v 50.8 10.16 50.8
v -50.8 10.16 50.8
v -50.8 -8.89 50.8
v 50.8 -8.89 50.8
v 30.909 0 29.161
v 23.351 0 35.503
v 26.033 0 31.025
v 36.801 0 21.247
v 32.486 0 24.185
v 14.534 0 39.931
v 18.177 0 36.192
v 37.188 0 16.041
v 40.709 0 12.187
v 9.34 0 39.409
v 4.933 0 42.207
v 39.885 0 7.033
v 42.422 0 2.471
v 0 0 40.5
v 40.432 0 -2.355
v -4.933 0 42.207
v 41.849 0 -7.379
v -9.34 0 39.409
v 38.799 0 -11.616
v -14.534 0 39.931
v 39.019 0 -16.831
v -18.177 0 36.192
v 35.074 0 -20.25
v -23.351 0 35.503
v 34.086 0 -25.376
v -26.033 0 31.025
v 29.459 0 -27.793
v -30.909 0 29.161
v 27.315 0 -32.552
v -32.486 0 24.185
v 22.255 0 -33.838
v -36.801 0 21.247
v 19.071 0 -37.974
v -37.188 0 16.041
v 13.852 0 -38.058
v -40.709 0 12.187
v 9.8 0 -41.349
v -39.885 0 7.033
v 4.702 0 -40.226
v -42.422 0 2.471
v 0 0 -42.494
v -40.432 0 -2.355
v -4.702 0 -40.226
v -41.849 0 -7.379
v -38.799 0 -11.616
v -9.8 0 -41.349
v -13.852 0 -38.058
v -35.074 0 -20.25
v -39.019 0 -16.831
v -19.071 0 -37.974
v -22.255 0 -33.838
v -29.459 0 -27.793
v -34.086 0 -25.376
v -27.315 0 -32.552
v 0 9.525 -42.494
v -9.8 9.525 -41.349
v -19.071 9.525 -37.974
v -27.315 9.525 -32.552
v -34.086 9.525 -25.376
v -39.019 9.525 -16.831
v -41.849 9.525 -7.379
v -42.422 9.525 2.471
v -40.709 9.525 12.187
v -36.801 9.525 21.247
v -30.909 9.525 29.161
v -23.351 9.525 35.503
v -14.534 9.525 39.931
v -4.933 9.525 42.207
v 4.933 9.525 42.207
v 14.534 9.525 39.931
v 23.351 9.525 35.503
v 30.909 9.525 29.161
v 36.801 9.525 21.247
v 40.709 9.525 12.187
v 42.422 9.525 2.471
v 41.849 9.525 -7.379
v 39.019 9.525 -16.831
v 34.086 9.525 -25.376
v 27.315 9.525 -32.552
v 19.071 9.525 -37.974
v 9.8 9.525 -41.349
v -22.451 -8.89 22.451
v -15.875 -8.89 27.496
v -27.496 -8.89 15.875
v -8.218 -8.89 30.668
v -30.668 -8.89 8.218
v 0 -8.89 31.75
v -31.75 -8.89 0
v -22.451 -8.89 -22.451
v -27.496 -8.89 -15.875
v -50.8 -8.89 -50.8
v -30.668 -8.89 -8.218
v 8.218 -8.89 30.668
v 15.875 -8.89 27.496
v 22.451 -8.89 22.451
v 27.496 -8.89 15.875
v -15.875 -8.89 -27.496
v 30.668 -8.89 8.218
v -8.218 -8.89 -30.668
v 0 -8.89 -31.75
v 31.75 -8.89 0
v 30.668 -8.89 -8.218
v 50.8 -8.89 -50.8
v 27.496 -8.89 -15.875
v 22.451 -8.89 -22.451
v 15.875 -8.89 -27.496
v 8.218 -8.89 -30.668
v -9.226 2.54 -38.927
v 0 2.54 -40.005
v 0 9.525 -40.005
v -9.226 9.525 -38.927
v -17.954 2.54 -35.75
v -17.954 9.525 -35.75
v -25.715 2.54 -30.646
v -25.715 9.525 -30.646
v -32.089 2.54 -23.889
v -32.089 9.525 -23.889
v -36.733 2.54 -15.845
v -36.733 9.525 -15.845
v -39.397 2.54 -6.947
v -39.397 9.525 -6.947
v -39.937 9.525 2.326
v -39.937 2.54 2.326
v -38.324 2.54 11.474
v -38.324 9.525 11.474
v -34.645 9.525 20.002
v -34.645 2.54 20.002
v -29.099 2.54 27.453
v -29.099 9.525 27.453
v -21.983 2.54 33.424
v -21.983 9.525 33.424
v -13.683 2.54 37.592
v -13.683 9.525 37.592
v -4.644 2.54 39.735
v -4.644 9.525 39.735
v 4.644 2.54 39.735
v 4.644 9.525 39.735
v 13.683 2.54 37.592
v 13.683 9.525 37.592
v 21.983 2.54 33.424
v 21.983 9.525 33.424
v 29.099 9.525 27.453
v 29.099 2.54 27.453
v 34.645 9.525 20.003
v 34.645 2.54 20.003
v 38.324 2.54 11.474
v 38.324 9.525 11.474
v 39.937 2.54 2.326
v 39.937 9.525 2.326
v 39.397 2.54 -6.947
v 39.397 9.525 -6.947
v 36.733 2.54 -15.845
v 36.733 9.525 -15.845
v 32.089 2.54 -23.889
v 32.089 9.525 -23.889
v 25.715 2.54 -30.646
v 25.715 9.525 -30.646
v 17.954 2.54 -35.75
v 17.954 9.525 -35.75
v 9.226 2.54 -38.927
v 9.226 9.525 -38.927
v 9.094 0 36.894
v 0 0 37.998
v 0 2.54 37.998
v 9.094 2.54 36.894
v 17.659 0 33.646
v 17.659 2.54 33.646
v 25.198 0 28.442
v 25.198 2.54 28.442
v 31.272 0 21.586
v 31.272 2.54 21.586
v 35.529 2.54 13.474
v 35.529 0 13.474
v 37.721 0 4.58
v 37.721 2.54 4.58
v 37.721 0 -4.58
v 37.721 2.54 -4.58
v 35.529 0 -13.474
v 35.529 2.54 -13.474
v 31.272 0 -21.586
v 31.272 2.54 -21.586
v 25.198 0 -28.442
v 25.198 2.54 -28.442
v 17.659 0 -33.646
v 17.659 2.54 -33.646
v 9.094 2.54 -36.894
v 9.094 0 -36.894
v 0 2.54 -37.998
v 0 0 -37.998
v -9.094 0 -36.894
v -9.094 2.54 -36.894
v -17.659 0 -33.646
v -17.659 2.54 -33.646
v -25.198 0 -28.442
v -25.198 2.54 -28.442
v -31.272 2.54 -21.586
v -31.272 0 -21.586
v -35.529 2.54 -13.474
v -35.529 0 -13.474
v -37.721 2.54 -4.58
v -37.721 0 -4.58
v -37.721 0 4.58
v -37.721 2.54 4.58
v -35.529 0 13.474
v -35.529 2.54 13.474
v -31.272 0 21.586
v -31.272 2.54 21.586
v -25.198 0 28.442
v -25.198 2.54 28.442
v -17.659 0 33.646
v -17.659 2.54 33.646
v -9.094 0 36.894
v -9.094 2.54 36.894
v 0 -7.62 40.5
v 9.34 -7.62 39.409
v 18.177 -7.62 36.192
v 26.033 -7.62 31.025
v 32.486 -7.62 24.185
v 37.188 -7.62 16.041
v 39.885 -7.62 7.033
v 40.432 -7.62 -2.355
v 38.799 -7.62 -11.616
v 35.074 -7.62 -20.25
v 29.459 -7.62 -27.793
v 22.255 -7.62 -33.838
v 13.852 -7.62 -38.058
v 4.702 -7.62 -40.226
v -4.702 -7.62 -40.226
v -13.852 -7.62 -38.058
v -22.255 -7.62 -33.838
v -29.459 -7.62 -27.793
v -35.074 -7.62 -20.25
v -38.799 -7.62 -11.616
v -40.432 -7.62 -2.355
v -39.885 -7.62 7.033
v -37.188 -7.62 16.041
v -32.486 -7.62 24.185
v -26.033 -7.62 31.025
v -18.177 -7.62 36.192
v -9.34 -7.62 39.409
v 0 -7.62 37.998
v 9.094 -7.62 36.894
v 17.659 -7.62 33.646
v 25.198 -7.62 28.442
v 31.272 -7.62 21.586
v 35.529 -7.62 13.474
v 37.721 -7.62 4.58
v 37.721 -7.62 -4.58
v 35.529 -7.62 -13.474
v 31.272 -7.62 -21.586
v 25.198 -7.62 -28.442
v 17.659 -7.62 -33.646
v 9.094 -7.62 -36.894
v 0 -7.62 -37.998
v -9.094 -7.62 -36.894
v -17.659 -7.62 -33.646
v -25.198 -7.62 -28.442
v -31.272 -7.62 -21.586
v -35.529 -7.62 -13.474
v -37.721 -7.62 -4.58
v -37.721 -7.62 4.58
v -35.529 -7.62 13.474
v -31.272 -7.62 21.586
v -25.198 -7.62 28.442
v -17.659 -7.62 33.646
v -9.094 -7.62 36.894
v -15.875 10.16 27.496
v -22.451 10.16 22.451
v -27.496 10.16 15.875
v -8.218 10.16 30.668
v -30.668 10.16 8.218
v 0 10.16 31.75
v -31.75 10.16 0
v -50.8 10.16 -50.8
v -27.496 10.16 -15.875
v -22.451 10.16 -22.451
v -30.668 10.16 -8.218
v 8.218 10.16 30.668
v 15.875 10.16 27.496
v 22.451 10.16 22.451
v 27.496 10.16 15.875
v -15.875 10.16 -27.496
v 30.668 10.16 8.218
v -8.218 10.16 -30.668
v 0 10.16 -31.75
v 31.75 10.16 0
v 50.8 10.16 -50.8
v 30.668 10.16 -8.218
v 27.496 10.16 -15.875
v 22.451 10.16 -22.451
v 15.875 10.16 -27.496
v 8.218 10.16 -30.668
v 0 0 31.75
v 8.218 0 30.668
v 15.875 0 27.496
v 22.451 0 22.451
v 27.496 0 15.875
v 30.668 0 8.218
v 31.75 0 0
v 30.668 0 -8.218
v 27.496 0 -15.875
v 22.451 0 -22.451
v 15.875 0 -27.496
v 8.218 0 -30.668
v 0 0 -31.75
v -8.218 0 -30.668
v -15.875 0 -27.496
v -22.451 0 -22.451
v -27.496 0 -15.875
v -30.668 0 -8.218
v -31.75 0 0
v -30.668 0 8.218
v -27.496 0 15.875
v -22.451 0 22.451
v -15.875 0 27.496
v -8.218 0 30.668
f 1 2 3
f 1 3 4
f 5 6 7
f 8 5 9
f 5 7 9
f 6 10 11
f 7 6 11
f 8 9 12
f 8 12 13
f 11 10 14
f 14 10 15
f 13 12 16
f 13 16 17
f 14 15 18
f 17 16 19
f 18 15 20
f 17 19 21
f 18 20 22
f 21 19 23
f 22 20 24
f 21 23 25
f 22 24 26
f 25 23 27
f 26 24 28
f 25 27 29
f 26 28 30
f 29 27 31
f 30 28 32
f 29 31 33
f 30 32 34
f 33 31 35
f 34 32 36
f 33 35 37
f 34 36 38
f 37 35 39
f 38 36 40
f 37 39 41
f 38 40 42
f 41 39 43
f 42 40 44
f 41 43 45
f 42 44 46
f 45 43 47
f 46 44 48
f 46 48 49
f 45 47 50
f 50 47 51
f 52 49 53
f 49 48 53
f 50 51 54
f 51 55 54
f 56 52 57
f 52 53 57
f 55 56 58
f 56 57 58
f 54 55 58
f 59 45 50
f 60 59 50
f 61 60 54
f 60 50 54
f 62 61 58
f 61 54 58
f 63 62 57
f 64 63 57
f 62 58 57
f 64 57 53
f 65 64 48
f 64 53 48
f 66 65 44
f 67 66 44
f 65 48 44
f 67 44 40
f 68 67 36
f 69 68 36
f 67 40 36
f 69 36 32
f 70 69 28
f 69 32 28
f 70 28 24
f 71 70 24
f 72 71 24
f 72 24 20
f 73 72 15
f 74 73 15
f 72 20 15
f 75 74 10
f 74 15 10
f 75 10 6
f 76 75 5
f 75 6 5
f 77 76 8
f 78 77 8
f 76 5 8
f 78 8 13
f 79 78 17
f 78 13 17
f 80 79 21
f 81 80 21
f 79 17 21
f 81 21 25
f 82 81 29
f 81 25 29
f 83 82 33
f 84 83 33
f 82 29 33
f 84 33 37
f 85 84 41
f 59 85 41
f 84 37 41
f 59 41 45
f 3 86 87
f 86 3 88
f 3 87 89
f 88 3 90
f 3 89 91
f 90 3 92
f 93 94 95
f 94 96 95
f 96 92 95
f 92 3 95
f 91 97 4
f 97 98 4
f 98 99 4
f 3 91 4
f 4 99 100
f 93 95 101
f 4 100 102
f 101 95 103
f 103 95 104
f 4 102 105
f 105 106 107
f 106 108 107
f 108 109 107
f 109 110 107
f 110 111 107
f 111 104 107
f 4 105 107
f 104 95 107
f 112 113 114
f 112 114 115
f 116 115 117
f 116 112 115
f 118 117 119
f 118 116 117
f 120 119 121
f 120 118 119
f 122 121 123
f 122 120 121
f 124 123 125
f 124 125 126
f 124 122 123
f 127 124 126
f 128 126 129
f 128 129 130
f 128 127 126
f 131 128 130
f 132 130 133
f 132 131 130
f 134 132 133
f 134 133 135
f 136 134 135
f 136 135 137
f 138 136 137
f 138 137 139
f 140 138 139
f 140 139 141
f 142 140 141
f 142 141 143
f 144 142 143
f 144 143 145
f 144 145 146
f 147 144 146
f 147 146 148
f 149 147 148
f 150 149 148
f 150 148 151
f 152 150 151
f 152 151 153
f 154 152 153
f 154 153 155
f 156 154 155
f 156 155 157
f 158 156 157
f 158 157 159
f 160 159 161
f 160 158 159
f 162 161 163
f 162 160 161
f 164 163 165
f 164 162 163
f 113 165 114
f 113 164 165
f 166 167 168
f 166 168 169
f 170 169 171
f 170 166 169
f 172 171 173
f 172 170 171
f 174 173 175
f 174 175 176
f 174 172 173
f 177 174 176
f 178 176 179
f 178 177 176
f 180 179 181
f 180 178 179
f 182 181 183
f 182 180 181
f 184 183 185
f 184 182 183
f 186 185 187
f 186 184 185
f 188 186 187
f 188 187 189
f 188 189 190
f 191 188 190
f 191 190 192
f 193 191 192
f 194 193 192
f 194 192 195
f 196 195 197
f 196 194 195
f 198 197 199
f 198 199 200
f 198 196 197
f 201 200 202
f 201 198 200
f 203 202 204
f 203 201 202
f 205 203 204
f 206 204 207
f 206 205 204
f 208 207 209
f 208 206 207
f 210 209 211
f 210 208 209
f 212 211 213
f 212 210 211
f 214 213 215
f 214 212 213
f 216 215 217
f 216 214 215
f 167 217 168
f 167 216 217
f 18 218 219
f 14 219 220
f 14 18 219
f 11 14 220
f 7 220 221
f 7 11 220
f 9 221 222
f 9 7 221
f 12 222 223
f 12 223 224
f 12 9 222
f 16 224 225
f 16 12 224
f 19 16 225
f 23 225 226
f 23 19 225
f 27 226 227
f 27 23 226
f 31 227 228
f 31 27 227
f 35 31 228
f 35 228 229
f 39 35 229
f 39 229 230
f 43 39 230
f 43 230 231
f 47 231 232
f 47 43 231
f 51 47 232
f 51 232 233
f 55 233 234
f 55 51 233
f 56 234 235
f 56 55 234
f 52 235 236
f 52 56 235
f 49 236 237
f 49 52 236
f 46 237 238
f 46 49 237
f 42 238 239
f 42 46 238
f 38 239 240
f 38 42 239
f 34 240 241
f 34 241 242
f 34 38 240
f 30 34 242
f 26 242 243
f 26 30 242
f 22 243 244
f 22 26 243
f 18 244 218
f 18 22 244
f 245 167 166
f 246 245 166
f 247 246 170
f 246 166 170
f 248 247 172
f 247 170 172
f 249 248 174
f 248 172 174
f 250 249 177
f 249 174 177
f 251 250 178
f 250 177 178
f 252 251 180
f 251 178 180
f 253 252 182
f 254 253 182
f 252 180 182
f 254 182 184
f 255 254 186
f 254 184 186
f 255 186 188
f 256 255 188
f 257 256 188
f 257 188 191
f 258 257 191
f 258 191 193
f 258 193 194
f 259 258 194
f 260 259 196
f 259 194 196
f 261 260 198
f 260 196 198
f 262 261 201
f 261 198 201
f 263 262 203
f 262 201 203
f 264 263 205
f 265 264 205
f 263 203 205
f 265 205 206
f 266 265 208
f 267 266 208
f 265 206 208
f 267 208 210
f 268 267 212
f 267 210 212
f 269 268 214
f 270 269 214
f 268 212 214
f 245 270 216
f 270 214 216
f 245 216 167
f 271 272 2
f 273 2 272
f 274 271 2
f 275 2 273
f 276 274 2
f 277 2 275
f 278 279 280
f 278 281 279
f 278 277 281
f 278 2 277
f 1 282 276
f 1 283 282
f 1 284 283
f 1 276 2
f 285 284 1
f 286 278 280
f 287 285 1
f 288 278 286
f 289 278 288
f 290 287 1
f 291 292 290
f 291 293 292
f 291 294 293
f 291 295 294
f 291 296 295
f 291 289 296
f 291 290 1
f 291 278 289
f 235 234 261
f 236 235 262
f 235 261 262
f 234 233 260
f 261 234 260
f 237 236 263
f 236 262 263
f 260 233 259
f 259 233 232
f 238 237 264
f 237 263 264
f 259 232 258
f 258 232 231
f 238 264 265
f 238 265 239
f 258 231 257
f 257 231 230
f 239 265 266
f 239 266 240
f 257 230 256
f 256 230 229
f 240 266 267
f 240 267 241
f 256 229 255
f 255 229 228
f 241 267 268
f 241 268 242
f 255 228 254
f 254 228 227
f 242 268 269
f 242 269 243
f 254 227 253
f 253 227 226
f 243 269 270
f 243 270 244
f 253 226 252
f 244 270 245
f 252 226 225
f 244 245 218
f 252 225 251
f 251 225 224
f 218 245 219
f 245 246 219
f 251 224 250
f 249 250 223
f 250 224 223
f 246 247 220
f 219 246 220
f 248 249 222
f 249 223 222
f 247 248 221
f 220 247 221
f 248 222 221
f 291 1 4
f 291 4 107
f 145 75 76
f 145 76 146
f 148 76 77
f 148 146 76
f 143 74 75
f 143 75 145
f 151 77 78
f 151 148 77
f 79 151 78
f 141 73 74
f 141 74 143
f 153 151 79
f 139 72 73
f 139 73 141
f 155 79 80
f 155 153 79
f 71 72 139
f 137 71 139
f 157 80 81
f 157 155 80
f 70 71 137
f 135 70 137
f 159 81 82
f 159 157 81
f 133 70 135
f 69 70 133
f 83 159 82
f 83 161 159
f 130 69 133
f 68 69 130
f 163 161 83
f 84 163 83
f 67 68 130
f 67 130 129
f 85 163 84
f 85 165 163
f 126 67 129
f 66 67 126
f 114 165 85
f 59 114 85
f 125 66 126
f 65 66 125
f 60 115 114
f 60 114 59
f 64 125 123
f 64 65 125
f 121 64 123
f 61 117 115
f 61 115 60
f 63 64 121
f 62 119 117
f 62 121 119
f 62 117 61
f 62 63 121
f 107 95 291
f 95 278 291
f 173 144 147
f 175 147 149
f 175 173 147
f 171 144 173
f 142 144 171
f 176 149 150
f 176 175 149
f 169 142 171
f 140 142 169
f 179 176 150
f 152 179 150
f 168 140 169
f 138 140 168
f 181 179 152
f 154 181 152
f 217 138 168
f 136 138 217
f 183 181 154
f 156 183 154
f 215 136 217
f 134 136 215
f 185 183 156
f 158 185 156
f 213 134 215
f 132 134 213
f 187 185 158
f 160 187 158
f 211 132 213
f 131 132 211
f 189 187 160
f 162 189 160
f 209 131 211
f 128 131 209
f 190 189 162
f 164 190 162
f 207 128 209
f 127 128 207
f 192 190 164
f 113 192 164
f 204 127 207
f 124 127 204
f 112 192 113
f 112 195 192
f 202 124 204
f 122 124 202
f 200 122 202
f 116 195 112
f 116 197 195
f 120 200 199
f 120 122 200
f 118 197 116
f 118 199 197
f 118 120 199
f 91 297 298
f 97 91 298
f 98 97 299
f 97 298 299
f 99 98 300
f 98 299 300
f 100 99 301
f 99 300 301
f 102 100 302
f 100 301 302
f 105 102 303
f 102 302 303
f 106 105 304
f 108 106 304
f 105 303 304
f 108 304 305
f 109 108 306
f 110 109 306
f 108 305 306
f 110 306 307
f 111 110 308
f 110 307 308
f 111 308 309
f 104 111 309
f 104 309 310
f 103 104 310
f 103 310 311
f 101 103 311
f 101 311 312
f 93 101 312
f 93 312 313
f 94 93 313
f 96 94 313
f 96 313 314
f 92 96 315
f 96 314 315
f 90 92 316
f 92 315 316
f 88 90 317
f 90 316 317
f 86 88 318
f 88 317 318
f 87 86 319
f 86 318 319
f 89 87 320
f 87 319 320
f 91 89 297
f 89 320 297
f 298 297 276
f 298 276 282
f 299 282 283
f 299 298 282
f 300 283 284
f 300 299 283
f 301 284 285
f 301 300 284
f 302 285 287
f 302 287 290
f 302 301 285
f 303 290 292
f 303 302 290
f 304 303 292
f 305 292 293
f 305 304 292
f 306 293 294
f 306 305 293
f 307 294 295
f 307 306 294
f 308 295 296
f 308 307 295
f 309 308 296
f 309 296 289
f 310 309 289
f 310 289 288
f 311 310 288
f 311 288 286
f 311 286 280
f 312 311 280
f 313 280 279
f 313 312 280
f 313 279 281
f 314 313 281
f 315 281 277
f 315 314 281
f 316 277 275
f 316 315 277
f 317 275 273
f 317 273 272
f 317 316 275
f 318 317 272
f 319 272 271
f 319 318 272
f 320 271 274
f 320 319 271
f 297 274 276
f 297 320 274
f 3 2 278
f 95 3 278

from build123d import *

# Parameters (mm, degrees)
SKETCH2_R                = 42.4942
SKETCH2_R_2              = 40.005
BOSS_EXTRUDE1_DEPTH      = 9.525
SKETCH2_4_R              = 40.005
SKETCH2_4_R_2            = 37.9984
BOSS_EXTRUDE2_DEPTH      = 2.54
BOSS_EXTRUDE3_START      = -7.62
SKETCH2_5_R              = 40.5003
SKETCH2_5_R_2            = 37.9984
BOSS_EXTRUDE3_DEPTH      = 7.62
BOSS_EXTRUDE4_DEPTH      = 10.16
BOSS_EXTRUDE4_DEPTH_BACK = 8.89
SKETCH3_W                = 101.6
SKETCH3_H                = 101.6
SKETCH3_R                = 31.75


with BuildPart() as part:
    # Sketch2 → Boss-Extrude1 (new body)
    with BuildSketch(Plane(origin=(0, 0, 0), x_dir=(1, 0, 0), z_dir=(0, 1, 0))):
        Circle(SKETCH2_R)
        Circle(SKETCH2_R_2, mode=Mode.SUBTRACT)
    extrude(amount=BOSS_EXTRUDE1_DEPTH)

    # Sketch2<4> → Boss-Extrude2 (add)
    with BuildSketch(Plane(origin=(0, 0, 0), x_dir=(1, 0, 0), z_dir=(0, 1, 0))):
        Circle(SKETCH2_4_R)
        Circle(SKETCH2_4_R_2, mode=Mode.SUBTRACT)
    extrude(amount=BOSS_EXTRUDE2_DEPTH)

    # Sketch2<5> → Boss-Extrude3 (add)
    with BuildSketch(Plane(origin=(0, 0, 0), x_dir=(1, 0, 0), z_dir=(0, 1, 0)).offset(BOSS_EXTRUDE3_START)):
        Circle(SKETCH2_5_R)
        Circle(SKETCH2_5_R_2, mode=Mode.SUBTRACT)
    extrude(amount=BOSS_EXTRUDE3_DEPTH)


with BuildPart() as body_2:
    # Sketch3 → Boss-Extrude4 (new, two sides: drawn at the far end of the back side and taken through both)
    with BuildSketch(Plane(origin=(0, 0, 0), x_dir=(1, 0, 0), z_dir=(0, 1, 0)).offset(-BOSS_EXTRUDE4_DEPTH_BACK)):
        Rectangle(SKETCH3_W, SKETCH3_H)
        Circle(SKETCH3_R, mode=Mode.SUBTRACT)
    extrude(amount=BOSS_EXTRUDE4_DEPTH + BOSS_EXTRUDE4_DEPTH_BACK)


solid = Compound([part.part, body_2.part])
